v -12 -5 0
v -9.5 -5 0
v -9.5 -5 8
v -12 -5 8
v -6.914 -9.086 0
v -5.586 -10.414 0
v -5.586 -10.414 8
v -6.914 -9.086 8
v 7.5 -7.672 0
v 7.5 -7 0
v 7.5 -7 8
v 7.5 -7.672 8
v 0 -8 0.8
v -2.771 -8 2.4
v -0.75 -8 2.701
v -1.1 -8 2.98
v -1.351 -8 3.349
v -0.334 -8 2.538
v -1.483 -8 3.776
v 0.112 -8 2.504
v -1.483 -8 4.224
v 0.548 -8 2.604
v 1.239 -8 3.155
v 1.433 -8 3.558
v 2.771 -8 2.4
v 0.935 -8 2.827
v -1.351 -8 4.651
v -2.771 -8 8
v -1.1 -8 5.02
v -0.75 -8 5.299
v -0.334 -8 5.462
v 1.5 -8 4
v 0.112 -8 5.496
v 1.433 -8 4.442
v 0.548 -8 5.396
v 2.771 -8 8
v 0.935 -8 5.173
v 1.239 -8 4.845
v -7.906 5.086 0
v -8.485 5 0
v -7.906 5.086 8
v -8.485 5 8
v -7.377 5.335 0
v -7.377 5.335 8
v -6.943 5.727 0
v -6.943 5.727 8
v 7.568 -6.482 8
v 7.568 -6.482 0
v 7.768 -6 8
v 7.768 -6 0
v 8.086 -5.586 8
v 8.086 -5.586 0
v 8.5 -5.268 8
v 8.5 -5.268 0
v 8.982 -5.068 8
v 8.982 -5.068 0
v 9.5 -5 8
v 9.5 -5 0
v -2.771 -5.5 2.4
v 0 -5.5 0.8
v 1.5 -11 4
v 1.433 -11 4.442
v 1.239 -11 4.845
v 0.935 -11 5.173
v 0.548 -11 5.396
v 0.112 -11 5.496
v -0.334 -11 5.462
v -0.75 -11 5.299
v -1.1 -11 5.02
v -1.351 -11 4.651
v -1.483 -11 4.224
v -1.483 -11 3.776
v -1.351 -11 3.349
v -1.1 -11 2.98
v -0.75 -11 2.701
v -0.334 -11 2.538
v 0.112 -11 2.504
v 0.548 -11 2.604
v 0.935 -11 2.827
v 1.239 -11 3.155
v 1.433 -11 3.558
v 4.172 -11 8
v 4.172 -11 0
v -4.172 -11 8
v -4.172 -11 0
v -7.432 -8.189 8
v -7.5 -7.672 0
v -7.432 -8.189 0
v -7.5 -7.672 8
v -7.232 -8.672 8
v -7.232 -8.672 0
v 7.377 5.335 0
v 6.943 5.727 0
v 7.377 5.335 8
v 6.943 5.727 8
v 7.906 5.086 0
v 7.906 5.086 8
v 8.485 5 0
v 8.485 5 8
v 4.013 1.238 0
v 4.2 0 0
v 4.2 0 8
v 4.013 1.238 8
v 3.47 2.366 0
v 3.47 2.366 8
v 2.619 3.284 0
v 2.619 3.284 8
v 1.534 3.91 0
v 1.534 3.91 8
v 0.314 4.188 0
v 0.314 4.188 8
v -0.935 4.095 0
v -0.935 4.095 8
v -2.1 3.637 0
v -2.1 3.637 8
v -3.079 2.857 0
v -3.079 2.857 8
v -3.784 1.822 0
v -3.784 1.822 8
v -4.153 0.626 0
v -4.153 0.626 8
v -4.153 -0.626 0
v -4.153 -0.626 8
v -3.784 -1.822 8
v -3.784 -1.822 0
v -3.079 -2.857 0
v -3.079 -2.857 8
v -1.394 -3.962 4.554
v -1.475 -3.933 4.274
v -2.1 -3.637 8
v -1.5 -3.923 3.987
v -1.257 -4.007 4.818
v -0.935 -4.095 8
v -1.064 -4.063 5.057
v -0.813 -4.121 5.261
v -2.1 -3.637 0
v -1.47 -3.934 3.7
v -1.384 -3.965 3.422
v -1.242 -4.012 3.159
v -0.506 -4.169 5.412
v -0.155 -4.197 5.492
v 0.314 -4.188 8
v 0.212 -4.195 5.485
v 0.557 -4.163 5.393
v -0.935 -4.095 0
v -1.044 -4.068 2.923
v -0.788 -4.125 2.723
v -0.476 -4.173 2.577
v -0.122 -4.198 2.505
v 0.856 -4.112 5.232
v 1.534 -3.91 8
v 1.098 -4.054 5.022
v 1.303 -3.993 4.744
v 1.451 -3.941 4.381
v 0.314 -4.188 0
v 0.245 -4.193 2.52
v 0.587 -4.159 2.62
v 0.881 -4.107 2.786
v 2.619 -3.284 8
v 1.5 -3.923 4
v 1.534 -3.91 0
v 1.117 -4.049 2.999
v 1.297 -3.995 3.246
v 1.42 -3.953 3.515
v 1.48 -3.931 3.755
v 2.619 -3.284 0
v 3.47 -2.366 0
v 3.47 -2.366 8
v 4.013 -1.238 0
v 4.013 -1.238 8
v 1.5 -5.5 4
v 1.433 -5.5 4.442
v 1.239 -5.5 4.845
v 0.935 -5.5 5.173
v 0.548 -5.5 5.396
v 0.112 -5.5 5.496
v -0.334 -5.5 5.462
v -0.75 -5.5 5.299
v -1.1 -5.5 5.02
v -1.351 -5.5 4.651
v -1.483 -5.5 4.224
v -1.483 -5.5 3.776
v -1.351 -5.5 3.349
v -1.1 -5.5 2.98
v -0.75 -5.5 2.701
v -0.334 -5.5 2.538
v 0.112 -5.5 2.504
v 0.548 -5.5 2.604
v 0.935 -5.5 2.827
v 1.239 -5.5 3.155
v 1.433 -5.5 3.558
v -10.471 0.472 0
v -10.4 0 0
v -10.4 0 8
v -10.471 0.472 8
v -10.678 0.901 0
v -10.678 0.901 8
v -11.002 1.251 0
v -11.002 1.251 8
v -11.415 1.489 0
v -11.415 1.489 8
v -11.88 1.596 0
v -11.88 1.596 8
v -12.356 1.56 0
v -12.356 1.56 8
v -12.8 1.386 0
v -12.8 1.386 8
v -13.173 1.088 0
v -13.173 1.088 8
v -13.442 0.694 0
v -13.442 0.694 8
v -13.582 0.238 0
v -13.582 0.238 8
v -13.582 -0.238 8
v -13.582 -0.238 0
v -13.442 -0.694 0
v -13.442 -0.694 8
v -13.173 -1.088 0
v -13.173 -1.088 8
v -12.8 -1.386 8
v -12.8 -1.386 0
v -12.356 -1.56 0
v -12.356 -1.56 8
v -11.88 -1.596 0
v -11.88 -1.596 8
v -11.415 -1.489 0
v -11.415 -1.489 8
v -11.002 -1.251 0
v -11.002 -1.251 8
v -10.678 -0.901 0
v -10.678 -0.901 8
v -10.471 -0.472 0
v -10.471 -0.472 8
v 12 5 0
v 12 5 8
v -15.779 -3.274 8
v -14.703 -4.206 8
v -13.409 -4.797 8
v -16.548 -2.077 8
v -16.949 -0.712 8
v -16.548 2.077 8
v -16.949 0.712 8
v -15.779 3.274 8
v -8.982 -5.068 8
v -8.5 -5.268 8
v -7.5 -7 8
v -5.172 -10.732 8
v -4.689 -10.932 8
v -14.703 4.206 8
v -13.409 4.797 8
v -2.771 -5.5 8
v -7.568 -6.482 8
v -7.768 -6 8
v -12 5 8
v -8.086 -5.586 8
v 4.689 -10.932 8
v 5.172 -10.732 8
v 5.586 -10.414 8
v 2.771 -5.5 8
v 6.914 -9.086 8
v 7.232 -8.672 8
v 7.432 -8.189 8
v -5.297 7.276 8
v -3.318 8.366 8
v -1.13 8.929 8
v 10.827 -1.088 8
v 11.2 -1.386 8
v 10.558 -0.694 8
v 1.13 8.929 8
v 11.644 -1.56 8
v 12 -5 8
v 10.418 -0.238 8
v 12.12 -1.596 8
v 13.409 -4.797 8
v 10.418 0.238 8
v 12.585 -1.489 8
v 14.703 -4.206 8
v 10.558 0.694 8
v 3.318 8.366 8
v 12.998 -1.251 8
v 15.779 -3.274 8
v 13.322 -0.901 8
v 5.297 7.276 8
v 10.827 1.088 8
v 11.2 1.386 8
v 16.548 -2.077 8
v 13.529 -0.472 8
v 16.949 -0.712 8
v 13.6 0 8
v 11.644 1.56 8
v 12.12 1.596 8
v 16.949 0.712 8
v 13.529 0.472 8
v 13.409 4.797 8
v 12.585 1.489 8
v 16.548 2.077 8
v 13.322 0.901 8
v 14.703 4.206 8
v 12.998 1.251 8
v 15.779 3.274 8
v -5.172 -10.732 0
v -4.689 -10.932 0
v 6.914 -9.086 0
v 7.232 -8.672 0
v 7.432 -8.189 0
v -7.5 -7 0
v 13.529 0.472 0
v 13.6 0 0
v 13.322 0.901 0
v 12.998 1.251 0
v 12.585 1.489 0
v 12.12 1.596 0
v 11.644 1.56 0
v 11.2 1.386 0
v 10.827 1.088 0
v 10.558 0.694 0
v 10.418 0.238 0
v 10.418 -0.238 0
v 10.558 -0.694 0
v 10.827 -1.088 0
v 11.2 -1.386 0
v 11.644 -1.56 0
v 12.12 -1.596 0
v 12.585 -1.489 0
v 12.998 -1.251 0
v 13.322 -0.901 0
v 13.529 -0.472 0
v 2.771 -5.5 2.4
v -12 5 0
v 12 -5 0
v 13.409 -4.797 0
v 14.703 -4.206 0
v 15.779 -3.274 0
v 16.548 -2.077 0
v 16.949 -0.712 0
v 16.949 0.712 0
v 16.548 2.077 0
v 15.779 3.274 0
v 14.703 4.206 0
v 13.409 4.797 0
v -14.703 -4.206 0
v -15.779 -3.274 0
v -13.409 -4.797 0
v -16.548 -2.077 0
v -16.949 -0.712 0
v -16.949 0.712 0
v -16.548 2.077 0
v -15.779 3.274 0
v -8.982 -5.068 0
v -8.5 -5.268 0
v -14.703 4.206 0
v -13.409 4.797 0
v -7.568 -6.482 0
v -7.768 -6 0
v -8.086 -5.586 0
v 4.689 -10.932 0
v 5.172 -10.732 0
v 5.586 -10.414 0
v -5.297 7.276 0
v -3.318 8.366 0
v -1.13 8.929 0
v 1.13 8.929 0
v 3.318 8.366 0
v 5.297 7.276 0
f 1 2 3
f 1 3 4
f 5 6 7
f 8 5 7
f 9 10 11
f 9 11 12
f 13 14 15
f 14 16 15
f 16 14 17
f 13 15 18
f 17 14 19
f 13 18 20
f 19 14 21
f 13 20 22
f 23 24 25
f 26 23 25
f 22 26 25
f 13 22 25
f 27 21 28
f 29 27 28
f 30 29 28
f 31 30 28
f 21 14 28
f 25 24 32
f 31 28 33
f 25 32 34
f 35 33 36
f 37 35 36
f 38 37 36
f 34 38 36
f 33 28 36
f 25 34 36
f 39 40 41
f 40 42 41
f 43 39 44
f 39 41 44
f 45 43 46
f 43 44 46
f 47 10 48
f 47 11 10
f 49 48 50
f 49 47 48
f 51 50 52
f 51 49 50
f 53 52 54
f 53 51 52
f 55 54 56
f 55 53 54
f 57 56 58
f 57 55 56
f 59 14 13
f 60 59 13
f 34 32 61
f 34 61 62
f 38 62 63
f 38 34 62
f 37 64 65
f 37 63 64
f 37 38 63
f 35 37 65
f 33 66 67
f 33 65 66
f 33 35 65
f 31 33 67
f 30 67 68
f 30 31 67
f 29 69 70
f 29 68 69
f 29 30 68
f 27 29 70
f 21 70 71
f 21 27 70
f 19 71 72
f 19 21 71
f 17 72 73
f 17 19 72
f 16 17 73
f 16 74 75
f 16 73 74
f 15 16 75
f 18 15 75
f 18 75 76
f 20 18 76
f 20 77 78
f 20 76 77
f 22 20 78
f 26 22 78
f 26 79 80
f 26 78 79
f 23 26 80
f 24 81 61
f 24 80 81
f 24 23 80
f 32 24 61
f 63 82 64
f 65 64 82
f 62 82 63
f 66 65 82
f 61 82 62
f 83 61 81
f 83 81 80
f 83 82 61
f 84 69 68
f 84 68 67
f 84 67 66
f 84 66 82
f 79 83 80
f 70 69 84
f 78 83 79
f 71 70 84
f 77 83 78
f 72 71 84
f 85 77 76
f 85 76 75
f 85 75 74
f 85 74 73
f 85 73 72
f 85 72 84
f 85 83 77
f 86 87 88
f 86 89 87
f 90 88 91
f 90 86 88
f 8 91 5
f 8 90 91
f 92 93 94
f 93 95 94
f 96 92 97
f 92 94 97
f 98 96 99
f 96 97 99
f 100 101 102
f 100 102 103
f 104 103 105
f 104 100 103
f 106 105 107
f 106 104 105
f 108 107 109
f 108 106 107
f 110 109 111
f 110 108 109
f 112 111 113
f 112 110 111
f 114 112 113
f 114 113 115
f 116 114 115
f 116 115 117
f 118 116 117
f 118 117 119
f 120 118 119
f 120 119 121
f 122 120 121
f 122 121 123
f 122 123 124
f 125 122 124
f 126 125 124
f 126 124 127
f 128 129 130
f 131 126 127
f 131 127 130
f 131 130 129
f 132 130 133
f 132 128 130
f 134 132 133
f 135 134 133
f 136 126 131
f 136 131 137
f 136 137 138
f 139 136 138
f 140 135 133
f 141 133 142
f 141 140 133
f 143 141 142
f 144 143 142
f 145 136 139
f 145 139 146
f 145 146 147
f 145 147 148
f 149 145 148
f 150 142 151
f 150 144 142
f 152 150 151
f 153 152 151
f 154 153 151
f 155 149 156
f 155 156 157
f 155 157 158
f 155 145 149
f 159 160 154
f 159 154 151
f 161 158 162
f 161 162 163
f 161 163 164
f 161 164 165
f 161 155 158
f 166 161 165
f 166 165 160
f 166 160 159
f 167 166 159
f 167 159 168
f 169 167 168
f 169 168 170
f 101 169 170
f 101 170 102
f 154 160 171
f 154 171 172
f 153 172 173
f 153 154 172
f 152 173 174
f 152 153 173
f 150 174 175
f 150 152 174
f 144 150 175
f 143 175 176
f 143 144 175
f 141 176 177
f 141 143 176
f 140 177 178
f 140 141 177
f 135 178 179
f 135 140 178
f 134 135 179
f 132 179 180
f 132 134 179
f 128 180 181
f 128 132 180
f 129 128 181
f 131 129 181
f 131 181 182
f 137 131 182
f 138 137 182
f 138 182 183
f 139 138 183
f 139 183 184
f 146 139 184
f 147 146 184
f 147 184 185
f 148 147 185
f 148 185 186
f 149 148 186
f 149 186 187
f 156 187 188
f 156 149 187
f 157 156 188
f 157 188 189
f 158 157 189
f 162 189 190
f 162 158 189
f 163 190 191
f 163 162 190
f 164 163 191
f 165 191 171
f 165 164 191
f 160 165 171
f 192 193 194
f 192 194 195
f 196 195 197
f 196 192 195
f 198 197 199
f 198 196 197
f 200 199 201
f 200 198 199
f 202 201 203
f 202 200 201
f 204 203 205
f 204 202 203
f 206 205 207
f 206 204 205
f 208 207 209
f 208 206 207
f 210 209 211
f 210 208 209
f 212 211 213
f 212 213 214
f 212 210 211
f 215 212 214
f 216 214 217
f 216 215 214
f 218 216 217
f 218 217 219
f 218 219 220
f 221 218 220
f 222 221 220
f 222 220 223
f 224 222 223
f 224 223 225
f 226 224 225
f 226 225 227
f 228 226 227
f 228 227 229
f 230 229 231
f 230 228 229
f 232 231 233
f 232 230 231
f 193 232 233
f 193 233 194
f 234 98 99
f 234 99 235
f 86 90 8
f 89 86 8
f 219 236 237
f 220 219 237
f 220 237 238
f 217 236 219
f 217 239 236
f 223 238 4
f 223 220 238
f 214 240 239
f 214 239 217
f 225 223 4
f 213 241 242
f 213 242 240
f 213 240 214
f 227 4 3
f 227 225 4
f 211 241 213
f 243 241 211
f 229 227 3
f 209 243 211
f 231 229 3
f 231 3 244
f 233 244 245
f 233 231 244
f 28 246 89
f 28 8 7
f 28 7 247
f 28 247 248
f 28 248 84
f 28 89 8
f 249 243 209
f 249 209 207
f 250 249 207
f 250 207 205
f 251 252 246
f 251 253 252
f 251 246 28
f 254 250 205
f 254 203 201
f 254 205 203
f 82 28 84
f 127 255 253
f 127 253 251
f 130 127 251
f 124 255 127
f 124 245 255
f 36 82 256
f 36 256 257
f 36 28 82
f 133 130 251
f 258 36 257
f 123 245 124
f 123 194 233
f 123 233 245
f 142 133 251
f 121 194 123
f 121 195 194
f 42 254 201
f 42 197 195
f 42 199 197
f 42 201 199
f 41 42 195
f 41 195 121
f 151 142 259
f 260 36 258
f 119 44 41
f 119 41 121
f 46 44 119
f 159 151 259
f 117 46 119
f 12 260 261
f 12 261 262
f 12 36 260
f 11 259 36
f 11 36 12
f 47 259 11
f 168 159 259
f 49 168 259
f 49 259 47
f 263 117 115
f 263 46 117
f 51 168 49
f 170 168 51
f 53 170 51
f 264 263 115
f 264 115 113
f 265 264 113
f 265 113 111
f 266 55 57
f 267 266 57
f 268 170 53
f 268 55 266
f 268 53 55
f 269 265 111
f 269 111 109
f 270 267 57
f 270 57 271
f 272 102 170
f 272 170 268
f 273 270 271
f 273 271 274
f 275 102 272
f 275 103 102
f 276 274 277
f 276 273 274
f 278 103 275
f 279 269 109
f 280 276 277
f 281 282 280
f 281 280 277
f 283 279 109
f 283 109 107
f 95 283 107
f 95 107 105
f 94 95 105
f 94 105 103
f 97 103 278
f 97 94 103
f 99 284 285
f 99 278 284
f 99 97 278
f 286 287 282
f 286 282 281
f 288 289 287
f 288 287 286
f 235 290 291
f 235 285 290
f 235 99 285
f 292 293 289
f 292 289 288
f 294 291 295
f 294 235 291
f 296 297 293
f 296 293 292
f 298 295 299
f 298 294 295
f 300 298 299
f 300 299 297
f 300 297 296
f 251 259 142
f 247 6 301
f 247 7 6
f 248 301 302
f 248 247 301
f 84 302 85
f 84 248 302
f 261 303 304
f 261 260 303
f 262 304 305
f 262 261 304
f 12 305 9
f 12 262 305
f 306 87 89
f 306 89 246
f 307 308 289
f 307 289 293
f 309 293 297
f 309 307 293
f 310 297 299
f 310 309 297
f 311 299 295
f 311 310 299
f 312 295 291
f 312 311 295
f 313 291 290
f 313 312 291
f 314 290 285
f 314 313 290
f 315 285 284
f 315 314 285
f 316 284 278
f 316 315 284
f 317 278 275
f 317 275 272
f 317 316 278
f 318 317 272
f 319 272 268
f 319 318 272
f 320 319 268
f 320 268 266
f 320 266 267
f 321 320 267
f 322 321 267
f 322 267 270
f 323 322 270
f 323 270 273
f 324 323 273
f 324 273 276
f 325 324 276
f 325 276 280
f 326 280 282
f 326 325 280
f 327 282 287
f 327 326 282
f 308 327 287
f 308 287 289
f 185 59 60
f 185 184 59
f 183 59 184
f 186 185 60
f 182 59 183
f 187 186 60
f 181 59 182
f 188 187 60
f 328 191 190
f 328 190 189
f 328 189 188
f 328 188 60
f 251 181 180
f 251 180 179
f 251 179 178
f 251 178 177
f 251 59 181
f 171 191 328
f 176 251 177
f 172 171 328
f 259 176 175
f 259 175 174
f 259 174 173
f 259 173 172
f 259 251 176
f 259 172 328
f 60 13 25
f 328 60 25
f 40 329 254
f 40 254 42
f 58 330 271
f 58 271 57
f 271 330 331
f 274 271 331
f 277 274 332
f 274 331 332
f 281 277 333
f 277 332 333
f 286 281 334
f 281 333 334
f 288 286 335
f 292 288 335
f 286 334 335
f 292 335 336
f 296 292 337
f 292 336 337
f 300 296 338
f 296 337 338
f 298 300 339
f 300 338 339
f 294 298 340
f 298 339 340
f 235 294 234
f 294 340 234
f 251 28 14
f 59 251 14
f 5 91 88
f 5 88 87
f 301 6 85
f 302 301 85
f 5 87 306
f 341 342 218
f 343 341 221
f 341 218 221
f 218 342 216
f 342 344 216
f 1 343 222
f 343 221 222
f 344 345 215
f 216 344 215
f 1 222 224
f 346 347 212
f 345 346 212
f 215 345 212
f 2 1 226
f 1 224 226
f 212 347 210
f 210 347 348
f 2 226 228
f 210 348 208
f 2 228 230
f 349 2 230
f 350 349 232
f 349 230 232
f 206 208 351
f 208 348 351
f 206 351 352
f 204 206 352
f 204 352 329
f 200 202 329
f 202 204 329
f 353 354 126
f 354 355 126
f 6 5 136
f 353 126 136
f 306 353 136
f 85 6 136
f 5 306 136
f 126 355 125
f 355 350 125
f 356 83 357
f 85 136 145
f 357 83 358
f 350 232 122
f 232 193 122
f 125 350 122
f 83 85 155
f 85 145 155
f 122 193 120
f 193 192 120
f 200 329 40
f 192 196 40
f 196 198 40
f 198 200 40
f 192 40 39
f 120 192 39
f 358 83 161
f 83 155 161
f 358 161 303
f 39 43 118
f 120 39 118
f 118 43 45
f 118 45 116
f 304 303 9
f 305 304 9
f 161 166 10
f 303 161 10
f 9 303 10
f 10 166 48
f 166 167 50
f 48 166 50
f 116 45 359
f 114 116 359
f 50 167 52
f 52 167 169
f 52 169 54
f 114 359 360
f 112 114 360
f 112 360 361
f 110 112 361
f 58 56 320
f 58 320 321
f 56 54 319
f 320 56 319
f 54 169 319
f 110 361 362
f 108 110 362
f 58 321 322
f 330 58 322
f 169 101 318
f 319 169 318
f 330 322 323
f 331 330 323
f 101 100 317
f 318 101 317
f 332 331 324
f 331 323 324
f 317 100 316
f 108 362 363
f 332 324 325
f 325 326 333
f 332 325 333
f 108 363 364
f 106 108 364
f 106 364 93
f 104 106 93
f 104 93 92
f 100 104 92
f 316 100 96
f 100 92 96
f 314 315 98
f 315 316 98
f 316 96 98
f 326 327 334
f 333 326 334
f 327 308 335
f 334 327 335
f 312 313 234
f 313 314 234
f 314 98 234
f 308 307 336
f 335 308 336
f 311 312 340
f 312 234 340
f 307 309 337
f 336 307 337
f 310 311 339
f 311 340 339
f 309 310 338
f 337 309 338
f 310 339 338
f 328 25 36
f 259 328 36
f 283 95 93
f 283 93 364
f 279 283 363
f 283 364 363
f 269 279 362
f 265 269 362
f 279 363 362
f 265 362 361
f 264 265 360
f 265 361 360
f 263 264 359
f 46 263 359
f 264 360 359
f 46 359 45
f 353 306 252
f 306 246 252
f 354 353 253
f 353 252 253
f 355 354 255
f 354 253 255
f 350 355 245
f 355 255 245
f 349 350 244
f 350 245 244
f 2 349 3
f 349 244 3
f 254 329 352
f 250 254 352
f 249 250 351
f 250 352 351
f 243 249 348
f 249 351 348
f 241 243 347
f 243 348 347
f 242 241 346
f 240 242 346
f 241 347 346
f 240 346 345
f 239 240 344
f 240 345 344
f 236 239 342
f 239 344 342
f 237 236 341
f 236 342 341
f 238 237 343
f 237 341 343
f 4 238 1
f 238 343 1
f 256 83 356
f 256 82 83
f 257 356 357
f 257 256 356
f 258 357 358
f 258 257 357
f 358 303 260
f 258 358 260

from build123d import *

# Parameters (mm, degrees)
CYLINDER001_R          = 1.5
CYLINDER001_DEPTH      = 15
CYLINDER001_ROLL_ANGLE = 90
PAD002_DEPTH           = 2.5
SKETCH001_R            = 1.6
SKETCH001_R_2          = 4.2
PAD001_DEPTH           = 8
CHAMFER001_SIZE        = 2.5
FILLET001_R            = 2


with BuildPart() as cylinder001:
    # Cylinder001 → Cylinder001 (new body)
    with BuildSketch(Plane.XY):
        Circle(CYLINDER001_R)
    extrude(amount=CYLINDER001_DEPTH)


with BuildPart() as cylinder001_1:
    # Cylinder001 roll: moved
    add(cylinder001.part.rotate(Axis((0, 0, 0), (1, 0, 0)), CYLINDER001_ROLL_ANGLE))


with BuildPart() as cylinder001_2:
    # Cylinder001 placement: moved
    add(cylinder001_1.part.moved(Location((0, 0, 4))))


with BuildPart() as fusion005:
    # Sketch002 → Pad002 (new body)
    with BuildSketch(Plane.XZ.offset(8)):
        Polygon((0, 0.8), (2.771281, 2.4), (2.771281, 5.6), (2.771281, 11.6), (-2.771281, 11.6), (-2.771281, 5.6), (-2.771281, 2.4), align=None)
    extrude(amount=-PAD002_DEPTH)

    # Fusion005: union Cylinder001
    add(cylinder001_2.part)


with BuildPart() as cut002:
    # Sketch001 → Pad001 (new body)
    with BuildSketch(Plane.XY):
        with BuildLine():
            ThreePointArc((-12.000024, 5), (-17, 0), (-12.000024, -5))
            Line((-7.5, -5), (-12.000024, -5))
            Line((-7.5, -11), (-7.5, -5))
            Line((7.5, -11), (-7.5, -11))
            Line((7.5, -5), (7.5, -11))
            Line((12.000024, -5), (7.5, -5))
            ThreePointArc((12.000024, -5), (17, 0), (12.000024, 5))
            Line((7.483315, 5), (12.000024, 5))
            ThreePointArc((7.483315, 5), (0, 9), (-7.483315, 5))
            Line((-12.000024, 5), (-7.483315, 5))
        make_face()
        with Locations((-12, 0)):
            Circle(SKETCH001_R, mode=Mode.SUBTRACT)
        Circle(SKETCH001_R_2, mode=Mode.SUBTRACT)
        with Locations((12, 0)):
            Circle(SKETCH001_R, mode=Mode.SUBTRACT)
    extrude(amount=PAD001_DEPTH)

    # Chamfer001
    chamfer001_edges = [cut002.edges().sort_by_distance(p)[0] for p in [
        (-7.5, -11, 4),
        (7.5, -11, 4),
    ]]
    chamfer(chamfer001_edges, length=CHAMFER001_SIZE)

    # Fillet001
    fillet001_edges = [cut002.edges().sort_by_distance(p)[0] for p in [
        (-7.5, -8.5, 4),
        (-7.5, -5, 4),
        (-5, -11, 4),
        (5, -11, 4),
        (7.5, -8.5, 4),
        (-7.483315, 5, 4),
        (7.5, -5, 4),
        (7.483315, 5, 4),
    ]]
    fillet(fillet001_edges, radius=FILLET001_R)

    # Cut002: cut Fusion005
    add(fusion005.part, mode=Mode.SUBTRACT)


solid = cut002.part
